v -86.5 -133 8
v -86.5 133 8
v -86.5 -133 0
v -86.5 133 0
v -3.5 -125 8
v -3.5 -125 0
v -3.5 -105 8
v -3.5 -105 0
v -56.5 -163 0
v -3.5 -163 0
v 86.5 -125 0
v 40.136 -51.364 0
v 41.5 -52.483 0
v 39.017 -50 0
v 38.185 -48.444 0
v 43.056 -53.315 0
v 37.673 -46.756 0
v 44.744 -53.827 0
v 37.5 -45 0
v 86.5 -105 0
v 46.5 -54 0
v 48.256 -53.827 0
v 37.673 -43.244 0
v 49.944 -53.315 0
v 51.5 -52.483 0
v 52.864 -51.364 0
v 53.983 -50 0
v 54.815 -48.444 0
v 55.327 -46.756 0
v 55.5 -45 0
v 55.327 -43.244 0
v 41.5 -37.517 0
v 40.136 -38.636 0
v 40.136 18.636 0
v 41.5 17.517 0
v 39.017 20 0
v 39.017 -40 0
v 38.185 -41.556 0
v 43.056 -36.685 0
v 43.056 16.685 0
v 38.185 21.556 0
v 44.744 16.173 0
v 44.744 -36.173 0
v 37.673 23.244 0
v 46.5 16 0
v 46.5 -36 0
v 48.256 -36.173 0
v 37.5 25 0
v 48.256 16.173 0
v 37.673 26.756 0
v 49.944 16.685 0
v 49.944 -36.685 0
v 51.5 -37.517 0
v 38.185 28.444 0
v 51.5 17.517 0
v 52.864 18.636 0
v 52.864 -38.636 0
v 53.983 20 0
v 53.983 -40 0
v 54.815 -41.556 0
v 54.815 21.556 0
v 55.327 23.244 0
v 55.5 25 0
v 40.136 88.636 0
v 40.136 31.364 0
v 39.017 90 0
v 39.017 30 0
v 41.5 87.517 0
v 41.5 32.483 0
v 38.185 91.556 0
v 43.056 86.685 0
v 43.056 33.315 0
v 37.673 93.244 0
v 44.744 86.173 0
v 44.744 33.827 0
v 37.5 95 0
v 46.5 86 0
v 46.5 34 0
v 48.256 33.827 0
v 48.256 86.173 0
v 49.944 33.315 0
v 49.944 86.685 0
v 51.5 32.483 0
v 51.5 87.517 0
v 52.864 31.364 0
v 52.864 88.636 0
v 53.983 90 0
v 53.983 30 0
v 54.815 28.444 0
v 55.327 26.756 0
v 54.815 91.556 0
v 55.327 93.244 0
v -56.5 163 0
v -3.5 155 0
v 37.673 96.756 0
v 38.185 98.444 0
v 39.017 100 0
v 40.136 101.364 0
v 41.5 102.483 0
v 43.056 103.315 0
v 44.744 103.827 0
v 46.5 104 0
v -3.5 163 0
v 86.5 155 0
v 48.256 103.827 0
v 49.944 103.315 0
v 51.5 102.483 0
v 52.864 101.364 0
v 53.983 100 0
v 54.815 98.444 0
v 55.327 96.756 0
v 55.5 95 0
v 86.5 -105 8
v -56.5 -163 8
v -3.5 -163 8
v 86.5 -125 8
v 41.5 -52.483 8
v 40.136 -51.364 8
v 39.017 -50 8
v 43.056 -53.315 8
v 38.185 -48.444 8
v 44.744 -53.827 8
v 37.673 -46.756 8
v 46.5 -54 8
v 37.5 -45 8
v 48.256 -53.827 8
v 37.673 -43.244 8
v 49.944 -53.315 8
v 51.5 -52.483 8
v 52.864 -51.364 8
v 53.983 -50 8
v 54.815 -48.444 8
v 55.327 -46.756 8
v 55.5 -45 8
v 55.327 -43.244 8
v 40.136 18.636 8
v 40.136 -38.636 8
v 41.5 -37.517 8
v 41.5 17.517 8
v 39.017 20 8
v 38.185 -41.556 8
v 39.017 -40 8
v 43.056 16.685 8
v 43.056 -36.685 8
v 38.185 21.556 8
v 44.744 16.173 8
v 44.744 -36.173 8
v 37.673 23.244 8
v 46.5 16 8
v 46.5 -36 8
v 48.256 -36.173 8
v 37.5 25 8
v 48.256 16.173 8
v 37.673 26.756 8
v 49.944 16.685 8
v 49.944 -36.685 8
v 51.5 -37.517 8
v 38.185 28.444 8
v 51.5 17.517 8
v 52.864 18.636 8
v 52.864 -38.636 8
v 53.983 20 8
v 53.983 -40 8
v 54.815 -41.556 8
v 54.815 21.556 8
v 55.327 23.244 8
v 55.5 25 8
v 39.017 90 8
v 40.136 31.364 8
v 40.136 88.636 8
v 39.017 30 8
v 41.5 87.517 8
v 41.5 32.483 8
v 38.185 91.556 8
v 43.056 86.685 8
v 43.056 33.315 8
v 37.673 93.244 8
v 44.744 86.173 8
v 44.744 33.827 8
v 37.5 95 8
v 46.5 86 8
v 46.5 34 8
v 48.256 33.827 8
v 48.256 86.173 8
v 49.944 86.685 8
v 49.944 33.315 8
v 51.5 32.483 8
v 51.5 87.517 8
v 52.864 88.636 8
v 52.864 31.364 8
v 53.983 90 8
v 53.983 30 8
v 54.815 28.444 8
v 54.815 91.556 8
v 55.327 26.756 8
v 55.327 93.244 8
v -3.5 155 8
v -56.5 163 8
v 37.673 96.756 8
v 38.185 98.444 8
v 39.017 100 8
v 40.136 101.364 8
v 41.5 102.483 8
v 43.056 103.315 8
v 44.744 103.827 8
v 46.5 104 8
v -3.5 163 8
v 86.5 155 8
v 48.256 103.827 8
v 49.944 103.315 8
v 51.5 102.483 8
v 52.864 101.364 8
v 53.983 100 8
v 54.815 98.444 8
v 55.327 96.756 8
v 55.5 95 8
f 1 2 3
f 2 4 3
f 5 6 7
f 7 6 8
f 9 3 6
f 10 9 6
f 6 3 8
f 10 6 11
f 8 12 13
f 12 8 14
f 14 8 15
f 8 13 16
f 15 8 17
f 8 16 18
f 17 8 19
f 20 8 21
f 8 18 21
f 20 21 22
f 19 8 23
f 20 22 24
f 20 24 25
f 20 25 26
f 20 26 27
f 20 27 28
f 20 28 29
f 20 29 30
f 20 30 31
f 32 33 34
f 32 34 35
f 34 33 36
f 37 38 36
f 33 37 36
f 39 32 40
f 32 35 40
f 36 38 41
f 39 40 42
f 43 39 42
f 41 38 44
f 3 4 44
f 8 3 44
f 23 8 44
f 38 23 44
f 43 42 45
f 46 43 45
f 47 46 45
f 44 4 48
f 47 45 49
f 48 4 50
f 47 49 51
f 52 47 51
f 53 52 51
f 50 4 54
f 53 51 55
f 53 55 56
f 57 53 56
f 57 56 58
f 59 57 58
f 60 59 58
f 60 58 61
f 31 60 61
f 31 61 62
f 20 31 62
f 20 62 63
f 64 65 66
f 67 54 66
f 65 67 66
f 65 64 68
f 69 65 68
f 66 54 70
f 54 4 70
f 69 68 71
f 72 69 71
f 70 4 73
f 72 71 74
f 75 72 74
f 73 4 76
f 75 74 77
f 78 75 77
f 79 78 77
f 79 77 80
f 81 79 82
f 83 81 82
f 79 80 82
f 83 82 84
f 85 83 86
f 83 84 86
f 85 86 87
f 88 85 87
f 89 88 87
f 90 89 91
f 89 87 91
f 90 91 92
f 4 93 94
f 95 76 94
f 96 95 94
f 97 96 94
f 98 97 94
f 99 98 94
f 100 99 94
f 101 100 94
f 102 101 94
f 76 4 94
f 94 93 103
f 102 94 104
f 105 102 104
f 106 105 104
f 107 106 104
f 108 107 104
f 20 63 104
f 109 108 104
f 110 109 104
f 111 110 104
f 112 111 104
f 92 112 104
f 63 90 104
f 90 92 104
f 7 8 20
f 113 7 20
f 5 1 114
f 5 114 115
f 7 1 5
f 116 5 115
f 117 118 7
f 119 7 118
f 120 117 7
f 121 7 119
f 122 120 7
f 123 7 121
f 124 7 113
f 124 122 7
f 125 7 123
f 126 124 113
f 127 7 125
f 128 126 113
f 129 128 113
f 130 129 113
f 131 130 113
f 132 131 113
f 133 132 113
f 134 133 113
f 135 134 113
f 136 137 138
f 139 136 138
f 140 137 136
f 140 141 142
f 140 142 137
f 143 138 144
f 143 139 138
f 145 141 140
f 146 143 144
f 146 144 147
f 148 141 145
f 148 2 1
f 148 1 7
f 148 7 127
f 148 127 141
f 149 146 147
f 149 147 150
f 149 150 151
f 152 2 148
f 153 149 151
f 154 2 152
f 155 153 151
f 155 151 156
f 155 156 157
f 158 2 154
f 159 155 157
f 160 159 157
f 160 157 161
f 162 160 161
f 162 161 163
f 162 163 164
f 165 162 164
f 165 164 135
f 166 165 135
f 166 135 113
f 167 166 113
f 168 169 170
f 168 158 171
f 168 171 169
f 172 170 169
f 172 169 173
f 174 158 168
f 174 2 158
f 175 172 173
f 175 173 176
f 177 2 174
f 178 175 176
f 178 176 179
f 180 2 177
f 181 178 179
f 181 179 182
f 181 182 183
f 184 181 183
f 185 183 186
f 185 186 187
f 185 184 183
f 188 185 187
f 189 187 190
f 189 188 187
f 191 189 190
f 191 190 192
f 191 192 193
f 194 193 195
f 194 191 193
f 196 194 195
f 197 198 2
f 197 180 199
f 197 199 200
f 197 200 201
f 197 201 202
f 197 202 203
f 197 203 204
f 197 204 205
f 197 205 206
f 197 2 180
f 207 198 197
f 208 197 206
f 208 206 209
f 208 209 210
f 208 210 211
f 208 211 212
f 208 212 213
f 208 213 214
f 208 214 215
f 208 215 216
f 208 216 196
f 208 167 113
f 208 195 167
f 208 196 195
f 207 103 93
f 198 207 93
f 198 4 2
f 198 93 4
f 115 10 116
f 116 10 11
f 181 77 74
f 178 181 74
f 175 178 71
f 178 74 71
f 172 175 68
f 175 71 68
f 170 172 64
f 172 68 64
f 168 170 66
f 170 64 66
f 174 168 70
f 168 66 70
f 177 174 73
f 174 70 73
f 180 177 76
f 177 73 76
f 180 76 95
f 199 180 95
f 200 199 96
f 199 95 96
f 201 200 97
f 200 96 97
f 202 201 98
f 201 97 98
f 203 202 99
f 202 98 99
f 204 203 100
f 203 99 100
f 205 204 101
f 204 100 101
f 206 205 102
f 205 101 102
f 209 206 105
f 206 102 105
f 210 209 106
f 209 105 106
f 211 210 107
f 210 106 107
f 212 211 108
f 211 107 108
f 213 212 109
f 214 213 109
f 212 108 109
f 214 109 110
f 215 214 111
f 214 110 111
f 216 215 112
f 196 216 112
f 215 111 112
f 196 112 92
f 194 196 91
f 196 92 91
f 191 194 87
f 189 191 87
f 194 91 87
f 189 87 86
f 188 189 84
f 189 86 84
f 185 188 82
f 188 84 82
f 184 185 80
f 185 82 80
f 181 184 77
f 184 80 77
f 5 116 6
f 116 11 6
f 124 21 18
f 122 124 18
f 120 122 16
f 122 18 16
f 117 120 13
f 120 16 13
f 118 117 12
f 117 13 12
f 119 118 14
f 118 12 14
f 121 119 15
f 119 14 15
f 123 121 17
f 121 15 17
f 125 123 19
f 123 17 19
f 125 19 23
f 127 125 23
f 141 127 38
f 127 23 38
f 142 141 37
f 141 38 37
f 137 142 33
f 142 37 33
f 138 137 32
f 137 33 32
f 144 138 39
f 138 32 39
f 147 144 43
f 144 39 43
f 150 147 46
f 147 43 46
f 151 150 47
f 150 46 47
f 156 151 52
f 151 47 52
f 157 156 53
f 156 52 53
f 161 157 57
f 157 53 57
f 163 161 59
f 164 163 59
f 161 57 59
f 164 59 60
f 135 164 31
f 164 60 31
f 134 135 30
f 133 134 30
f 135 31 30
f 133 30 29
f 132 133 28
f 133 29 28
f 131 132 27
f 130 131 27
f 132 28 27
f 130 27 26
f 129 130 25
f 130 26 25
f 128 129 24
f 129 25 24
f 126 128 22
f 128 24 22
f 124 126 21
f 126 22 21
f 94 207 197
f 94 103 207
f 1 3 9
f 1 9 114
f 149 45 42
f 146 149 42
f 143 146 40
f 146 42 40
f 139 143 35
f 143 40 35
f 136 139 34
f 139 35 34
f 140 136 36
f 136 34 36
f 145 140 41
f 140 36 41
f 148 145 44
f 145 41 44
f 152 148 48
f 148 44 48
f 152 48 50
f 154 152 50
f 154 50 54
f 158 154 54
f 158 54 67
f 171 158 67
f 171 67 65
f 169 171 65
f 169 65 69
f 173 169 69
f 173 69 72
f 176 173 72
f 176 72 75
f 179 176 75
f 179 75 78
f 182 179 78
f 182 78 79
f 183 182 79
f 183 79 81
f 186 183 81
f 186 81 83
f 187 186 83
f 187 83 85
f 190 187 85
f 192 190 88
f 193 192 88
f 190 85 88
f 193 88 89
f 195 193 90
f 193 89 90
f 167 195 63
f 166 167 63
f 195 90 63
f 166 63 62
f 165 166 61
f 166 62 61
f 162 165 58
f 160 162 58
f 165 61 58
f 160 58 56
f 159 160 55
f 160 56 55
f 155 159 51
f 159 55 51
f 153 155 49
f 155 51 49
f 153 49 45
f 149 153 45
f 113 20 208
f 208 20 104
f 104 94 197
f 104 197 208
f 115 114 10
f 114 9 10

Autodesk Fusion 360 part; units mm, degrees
sketch "スケッチ1" plane through (0, 0, 0) normal (0, 0, 1) x (1, 0, 0)
  line L0 (-3.5, 163) -> (-86.5, 163)
  line L1 (-86.5, 163) -> (-86.5, -163)
  line L2 (-86.5, -163) -> (-3.5, -163)
  line L3 (86.5, -105) -> (86.5, 155)
  line L4 (82.2546, 155) -> (-86.5, -163) construction
  line L5 (-3.5, 163) -> (-3.5, 155)
  line L6 (-3.5, 155) -> (86.5, 155)
  line L7 (-86.5, -163) -> (-3.5, -163) construction
  line L8 (-3.5, -163) -> (86.5, -125)
  line L9 (86.5, -125) -> (-3.5, -125)
  line L10 (-3.5, -125) -> (-3.5, -105)
  line L11 (-3.5, -105) -> (86.5, -105)
  line L12 (-86.5, 163) -> (55.7209, -105) construction
  line L13 (66.3344, -125) -> (70.0256, -131.9558) construction
  dimension "d2" = 326
  dimension "d5" = 83
  dimension "d7" = 90
  dimension "d8" = 20
extrude "押し出し1" add sketch "スケッチ1" along normal blind 8
chamfer "面取り1" distance 30 angle 45 2 edges at (-86.5, -163, 4) (-86.5, 163, 4)
sketch "スケッチ2" plane through (0, 0, 8) normal (0, 0, 1) x (-1, 0, 0)
  line L0 (56.5, -163) -> (86.5, -133)
  line L1 (86.5, -133) -> (86.5, 133)
  line L2 (86.5, 133) -> (56.5, 163)
  line L3 (56.5, 163) -> (3.5, 163)
  line L4 (3.5, 163) -> (-86.5, 125)
  line L5 (-86.5, 125) -> (3.5, 125)
  line L6 (3.5, 125) -> (3.5, 105)
  line L7 (3.5, 105) -> (-86.5, 105)
  line L8 (-86.5, 105) -> (-86.5, -155)
  line L9 (-86.5, -155) -> (3.5, -155)
  line L10 (3.5, -155) -> (3.5, -163)
  line L11 (3.5, -163) -> (56.5, -163)
  line L12 (-86.5, -155) -> (-46.5, -155) construction
  line L13 (-46.5, -155) -> (-46.5, -95) construction
  line L14 (-46.5, -95) -> (-86.5, -95) construction
  line L15 (-86.5, -95) -> (-86.5, -155) construction
  line L16 (-46.5, -95) -> (-46.5, -25) construction
  line L17 (-46.5, -25) -> (-46.5, 45) construction
  point P0 (-46.5, -95)
  point P1 (-46.5, -25)
  point P2 (-46.5, 45)
  dimension "d12" = 40
  dimension "d13" = 60
  dimension "d14" = 70
  dimension "d15" = 70
hole "穴1" at (46.5, 95, 8) at (46.5, 25, 8) at (46.5, -45, 8) direction (0, 0, -1) diameter 18 end through all
equation "d5 = 30 mm + 53 mm"
